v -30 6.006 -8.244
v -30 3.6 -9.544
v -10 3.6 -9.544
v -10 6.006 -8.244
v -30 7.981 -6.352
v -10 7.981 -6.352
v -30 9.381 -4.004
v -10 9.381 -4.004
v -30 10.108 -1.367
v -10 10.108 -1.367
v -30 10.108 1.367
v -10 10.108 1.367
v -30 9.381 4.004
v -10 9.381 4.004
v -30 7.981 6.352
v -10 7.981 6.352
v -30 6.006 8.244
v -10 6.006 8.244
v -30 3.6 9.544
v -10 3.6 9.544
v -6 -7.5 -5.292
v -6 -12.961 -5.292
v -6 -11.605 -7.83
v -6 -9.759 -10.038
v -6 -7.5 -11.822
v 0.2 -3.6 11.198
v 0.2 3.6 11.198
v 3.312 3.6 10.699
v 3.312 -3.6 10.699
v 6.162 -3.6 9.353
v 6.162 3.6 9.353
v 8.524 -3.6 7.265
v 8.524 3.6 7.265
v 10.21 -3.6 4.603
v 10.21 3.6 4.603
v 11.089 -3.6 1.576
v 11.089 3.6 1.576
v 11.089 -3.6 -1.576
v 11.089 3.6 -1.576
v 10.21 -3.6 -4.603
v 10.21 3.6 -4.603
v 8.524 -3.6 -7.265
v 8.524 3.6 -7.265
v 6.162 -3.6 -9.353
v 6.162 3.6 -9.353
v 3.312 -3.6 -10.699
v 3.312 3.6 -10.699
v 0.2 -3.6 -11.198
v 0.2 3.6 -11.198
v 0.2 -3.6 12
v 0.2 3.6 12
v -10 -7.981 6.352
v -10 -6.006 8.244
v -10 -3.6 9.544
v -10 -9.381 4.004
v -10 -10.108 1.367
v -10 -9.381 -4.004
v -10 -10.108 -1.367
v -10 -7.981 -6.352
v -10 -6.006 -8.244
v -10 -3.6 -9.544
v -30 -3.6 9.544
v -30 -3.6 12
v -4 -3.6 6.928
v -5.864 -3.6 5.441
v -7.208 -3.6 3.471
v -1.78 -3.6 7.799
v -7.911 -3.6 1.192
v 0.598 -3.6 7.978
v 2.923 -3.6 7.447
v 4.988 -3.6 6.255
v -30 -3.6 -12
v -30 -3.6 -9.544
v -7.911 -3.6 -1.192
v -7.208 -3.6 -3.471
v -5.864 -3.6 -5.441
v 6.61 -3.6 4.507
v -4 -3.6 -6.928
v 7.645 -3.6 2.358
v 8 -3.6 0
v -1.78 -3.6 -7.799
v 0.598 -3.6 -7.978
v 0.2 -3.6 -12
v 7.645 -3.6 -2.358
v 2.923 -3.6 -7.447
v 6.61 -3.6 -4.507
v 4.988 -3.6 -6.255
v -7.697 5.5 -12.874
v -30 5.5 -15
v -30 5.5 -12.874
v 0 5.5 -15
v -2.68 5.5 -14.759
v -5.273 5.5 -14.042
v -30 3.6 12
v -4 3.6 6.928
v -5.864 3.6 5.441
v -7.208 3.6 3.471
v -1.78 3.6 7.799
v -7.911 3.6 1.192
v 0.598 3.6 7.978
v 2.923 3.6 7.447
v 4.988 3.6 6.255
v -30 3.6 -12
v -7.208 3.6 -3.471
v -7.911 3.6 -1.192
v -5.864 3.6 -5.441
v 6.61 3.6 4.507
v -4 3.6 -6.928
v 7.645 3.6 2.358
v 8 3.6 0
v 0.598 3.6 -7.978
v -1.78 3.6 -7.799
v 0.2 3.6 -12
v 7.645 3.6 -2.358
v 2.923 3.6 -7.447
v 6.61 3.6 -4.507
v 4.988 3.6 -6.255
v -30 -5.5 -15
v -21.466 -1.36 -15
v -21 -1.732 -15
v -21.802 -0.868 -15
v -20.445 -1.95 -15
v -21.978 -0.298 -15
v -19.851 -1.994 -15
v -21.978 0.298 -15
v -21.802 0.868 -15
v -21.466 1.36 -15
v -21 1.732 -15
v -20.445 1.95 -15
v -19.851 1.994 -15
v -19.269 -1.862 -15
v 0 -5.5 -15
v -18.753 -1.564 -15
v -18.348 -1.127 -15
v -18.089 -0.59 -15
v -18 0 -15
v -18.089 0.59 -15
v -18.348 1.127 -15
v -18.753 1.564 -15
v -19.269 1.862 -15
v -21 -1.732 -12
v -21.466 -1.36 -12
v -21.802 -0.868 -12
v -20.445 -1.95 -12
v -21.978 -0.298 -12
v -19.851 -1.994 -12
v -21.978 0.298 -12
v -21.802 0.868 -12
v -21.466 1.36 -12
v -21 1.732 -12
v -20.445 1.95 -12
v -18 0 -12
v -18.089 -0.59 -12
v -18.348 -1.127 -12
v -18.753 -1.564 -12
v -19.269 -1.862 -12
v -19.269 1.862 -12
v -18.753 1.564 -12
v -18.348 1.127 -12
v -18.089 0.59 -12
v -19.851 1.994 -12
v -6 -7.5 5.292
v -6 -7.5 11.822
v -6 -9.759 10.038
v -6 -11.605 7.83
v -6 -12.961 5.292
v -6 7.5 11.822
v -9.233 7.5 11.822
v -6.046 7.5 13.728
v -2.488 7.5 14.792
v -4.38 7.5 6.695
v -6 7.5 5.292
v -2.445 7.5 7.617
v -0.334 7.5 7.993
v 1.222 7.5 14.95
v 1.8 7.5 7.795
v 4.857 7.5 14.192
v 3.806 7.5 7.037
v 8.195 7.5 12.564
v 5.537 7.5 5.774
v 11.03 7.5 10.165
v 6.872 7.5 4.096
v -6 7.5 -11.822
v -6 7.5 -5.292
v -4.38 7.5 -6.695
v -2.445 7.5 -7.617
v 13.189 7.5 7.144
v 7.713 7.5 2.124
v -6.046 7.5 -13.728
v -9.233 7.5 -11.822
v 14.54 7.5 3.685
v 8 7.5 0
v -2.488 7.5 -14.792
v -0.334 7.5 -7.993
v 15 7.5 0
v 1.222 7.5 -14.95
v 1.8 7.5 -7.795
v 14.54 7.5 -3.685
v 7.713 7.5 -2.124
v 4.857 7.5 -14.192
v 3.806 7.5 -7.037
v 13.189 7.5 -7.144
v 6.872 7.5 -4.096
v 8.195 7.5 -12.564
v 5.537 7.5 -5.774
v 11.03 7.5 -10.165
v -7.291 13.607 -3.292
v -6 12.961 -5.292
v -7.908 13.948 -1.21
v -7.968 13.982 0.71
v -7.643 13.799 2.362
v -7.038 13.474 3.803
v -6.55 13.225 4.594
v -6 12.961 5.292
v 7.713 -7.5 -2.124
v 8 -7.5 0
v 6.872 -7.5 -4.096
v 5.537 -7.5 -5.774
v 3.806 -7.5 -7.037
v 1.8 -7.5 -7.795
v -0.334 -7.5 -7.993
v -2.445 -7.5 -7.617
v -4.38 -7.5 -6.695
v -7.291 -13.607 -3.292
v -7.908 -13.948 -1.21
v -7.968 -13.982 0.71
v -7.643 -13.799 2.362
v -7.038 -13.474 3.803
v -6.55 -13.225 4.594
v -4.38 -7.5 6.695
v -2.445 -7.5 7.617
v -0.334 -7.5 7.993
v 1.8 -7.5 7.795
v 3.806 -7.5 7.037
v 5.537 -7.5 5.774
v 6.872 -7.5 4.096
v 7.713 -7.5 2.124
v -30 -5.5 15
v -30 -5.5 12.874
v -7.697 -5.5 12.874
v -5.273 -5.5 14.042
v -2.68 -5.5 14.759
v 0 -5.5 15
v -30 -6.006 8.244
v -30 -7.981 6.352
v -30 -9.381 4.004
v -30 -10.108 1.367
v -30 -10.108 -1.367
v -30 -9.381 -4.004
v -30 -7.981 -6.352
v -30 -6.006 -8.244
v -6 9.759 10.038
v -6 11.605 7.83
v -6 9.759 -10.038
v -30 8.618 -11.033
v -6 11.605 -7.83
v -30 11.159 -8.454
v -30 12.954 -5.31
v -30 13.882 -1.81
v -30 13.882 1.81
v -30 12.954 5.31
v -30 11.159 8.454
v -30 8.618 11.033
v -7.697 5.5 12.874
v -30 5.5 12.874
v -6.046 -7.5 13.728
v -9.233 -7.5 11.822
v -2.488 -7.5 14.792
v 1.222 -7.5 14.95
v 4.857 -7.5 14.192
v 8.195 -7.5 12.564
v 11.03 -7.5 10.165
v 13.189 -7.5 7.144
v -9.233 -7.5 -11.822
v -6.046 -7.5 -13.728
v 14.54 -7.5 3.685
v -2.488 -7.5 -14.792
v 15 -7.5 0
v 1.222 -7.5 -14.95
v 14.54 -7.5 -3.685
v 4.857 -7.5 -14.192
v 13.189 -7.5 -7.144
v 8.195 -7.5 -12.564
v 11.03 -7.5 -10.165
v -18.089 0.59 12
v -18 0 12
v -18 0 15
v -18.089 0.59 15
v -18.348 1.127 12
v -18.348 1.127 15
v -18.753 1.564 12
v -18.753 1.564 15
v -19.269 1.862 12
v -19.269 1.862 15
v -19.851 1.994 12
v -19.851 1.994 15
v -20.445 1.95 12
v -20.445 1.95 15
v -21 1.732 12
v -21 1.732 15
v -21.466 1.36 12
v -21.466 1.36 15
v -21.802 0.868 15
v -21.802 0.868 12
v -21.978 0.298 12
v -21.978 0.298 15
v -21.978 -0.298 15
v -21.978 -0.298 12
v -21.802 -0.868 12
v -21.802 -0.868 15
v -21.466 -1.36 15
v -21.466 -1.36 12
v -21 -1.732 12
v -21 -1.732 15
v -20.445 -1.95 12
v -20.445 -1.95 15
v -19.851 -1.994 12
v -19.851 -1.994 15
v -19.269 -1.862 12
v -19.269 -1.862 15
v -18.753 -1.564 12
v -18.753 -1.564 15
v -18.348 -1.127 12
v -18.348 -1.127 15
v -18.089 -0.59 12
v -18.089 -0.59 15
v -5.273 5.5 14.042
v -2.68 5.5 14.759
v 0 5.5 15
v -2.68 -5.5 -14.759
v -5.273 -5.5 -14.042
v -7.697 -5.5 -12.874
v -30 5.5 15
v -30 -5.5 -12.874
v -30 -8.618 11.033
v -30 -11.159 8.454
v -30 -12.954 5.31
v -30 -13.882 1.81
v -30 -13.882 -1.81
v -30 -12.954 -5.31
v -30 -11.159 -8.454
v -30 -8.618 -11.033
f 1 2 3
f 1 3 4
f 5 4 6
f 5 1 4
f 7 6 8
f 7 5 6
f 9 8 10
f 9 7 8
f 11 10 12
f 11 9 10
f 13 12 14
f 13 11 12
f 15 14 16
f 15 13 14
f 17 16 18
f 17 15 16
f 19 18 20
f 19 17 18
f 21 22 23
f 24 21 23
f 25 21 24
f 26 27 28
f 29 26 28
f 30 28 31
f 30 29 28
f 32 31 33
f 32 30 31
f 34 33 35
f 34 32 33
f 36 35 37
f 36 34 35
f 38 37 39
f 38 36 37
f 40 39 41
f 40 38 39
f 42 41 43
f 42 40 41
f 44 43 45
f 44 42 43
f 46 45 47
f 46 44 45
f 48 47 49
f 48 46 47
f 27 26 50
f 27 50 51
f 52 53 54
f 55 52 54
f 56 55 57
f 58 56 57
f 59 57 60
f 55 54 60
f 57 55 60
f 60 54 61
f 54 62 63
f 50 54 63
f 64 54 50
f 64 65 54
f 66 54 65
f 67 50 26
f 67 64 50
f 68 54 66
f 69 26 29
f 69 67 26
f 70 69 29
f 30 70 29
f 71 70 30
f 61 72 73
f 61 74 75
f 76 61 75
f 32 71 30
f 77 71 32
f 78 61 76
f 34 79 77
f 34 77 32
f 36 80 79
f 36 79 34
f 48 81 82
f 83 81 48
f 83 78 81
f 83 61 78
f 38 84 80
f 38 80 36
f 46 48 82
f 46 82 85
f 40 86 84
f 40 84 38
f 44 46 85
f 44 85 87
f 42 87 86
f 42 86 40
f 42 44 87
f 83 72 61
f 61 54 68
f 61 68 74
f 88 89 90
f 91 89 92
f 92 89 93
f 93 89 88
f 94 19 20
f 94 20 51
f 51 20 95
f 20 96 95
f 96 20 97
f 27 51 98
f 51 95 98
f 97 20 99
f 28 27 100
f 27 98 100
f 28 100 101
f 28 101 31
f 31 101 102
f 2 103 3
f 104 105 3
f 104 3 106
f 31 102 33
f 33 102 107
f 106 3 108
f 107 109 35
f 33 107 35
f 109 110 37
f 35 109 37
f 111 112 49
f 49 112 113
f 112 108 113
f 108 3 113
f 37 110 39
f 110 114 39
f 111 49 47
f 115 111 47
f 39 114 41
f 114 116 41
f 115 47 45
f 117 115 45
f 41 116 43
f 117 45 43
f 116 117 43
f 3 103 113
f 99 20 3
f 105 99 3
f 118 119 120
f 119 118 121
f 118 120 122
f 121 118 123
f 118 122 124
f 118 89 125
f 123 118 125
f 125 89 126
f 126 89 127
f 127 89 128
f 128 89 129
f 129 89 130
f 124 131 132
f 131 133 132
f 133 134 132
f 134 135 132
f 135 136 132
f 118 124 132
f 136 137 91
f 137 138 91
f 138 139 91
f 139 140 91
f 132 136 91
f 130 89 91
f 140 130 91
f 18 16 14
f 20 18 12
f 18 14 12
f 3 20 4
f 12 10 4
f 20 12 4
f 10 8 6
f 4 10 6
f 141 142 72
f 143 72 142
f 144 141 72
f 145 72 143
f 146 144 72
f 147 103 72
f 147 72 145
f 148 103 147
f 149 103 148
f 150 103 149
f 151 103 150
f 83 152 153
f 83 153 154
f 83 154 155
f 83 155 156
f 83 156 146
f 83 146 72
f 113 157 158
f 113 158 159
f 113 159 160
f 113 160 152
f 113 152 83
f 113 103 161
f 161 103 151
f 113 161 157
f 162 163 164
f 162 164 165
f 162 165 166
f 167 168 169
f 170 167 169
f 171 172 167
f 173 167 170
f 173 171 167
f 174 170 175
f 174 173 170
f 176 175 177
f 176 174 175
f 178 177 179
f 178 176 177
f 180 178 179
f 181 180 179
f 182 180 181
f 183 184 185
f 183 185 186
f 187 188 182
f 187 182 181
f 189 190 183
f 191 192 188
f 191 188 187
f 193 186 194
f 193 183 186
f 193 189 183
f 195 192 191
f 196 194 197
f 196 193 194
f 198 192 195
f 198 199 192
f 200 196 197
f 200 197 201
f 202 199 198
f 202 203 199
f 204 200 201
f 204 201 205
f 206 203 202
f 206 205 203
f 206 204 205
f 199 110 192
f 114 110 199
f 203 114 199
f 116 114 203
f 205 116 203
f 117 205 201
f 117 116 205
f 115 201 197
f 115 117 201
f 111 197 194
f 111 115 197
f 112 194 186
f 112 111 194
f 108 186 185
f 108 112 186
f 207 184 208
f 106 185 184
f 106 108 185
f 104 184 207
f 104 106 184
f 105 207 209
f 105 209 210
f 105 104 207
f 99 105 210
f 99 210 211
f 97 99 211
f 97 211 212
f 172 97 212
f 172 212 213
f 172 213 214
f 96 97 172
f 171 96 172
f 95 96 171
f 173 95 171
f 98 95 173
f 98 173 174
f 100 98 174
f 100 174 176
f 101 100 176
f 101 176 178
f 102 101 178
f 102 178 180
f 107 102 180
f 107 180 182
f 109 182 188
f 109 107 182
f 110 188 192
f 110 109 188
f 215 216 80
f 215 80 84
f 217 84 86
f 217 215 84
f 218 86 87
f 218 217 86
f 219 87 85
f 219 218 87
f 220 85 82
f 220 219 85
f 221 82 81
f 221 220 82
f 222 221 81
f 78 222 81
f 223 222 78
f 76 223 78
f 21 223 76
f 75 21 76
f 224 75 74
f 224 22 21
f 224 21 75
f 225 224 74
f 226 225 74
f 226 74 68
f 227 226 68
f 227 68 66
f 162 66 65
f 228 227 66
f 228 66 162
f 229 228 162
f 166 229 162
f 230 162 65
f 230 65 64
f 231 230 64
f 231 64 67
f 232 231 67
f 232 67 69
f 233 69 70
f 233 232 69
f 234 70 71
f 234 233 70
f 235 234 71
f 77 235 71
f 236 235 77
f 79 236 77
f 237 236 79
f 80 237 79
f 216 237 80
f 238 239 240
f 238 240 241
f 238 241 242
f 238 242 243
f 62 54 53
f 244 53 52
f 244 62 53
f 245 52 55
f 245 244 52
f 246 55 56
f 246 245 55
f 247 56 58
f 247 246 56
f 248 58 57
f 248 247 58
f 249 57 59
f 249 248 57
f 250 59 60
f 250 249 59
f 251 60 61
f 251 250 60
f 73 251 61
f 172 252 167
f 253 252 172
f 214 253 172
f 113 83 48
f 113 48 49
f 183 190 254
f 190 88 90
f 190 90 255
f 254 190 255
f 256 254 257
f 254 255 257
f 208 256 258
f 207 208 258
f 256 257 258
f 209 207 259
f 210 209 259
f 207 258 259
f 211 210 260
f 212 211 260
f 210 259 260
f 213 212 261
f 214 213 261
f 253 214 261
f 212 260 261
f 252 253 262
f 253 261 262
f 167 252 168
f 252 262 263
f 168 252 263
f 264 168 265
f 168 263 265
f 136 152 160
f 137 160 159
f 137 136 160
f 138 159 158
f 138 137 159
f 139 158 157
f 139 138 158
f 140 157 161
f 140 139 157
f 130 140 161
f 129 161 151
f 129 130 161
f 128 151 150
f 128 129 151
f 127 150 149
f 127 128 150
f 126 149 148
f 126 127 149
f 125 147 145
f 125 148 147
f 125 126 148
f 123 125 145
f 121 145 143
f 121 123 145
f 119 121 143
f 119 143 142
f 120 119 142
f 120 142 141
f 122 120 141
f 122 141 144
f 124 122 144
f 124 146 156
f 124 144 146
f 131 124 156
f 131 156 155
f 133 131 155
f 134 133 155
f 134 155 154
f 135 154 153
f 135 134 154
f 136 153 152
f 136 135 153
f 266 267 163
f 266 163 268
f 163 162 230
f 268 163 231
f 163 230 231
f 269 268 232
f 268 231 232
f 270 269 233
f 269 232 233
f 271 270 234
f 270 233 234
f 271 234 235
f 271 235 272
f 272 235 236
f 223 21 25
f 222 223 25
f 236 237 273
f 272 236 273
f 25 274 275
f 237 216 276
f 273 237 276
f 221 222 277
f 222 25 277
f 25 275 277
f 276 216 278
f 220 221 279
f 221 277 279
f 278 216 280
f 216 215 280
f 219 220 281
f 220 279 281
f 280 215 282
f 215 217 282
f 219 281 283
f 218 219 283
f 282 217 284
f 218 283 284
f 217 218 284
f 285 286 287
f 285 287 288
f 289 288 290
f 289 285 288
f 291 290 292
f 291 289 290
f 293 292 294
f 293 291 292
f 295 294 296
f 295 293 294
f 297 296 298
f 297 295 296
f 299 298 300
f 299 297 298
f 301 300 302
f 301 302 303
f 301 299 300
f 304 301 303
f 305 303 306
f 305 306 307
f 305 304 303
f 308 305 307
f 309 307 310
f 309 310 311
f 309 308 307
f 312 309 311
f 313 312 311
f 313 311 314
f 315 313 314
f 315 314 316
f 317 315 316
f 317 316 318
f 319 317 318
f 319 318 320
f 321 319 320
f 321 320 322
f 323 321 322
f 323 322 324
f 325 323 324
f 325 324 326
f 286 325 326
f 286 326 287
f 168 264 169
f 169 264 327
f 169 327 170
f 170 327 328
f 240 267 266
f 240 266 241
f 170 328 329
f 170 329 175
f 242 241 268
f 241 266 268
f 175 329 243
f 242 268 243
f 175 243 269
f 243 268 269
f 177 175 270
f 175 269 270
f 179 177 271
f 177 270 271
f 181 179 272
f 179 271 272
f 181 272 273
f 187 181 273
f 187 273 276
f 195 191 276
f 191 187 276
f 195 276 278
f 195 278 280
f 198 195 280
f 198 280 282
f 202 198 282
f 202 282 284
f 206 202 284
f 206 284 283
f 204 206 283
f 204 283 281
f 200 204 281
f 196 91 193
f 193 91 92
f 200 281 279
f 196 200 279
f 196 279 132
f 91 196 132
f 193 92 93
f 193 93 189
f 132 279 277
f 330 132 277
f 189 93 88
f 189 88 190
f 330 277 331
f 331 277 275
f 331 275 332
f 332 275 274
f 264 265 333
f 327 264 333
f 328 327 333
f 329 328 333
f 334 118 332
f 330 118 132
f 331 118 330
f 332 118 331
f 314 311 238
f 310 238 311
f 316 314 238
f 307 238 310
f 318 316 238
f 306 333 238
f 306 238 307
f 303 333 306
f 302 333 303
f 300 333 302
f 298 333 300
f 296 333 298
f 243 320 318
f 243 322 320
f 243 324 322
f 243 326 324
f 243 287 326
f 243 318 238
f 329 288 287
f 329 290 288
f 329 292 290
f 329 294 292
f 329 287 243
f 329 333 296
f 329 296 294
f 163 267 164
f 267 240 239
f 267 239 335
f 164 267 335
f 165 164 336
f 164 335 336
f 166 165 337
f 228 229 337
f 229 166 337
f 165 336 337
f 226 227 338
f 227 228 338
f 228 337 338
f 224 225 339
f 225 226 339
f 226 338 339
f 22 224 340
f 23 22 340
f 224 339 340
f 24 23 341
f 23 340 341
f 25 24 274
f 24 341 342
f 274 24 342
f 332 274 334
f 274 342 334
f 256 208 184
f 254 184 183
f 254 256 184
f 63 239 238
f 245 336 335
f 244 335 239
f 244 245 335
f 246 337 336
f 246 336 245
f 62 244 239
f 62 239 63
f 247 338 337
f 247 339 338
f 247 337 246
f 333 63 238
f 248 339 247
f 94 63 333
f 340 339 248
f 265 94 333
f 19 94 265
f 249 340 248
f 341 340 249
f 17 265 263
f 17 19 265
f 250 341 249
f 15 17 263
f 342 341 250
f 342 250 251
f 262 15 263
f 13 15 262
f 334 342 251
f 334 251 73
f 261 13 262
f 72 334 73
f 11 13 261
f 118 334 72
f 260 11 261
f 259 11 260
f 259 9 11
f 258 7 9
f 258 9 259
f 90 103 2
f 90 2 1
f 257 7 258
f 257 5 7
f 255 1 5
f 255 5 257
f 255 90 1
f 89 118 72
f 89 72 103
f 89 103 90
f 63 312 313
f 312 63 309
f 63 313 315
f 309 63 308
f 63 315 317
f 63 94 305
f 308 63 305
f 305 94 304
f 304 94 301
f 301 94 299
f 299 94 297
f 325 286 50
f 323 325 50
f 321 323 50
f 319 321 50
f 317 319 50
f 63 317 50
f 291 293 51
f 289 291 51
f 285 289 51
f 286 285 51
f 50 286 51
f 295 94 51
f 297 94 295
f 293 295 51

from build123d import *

# Parameters (mm, degrees)
CYLINDER003_R           = 10.2
CYLINDER003_DEPTH       = 20
CYLINDER003_PITCH_ANGLE = 90
CYLINDER_R              = 11.2
CYLINDER_DEPTH          = 7.2
CYLINDER_ROLL_ANGLE     = -90
CYLINDER005_R           = 2
CYLINDER005_DEPTH       = 30
BOX_W                   = 30.2
BOX_H                   = 7.2
BOX_DEPTH               = 24
CYLINDER004_R           = 8
CYLINDER004_DEPTH       = 30
CYLINDER004_ROLL_ANGLE  = -90
CYLINDER002_R           = 14
CYLINDER002_DEPTH       = 24
CYLINDER002_PITCH_ANGLE = 90
BOX001_W                = 30
BOX001_H                = 11
BOX001_DEPTH            = 30
CYLINDER001_R           = 15
CYLINDER001_DEPTH       = 15
CYLINDER001_ROLL_ANGLE  = -90


with BuildPart() as pipe:
    # Cylinder003 → Cylinder003 (new body)
    with BuildSketch(Plane.XY):
        Circle(CYLINDER003_R)
    extrude(amount=CYLINDER003_DEPTH)


with BuildPart() as pipe_1:
    # Cylinder003 pitch: moved
    add(pipe.part.rotate(Axis((0, 0, 0), (0, 1, 0)), CYLINDER003_PITCH_ANGLE))


with BuildPart() as pipe_2:
    # Cylinder003 placement: moved
    add(pipe_1.part.moved(Location((-30, 0, 0))))


with BuildPart() as bearing:
    # Cylinder → Cylinder (new body)
    with BuildSketch(Plane.XY):
        Circle(CYLINDER_R)
    extrude(amount=CYLINDER_DEPTH)


with BuildPart() as bearing_1:
    # Cylinder roll: moved
    add(bearing.part.rotate(Axis((0, 0, 0), (1, 0, 0)), CYLINDER_ROLL_ANGLE))


with BuildPart() as bearing_2:
    # Cylinder placement: moved
    add(bearing_1.part.moved(Location((0, -3.6, 0))))


with BuildPart() as cylinder003:
    # Cylinder005 → Cylinder005 (new body)
    with BuildSketch(Plane(origin=(-20, 0, -15), x_dir=(1, 0, 0), z_dir=(0, 0, 1))):
        Circle(CYLINDER005_R)
    extrude(amount=CYLINDER005_DEPTH)


with BuildPart() as cube:
    # Box → Box (new body)
    with BuildSketch(Plane(origin=(-30, -3.6, -12), x_dir=(1, 0, 0), z_dir=(0, 0, 1))):
        with Locations((15.1, 3.6)):
            Rectangle(BOX_W, BOX_H)
    extrude(amount=BOX_DEPTH)


with BuildPart() as negative_fusion:
    # Cylinder004 → Cylinder004 (new body)
    with BuildSketch(Plane.XY):
        Circle(CYLINDER004_R)
    extrude(amount=CYLINDER004_DEPTH)


with BuildPart() as negative_fusion_1:
    # Cylinder004 roll: moved
    add(negative_fusion.part.rotate(Axis((0, 0, 0), (1, 0, 0)), CYLINDER004_ROLL_ANGLE))


with BuildPart() as negative_fusion_2:
    # Cylinder004 placement: moved
    add(negative_fusion_1.part.moved(Location((0, -15, 0))))

    # Fusion001: union Pipe, Bearing, Cylinder003, Cube
    add(pipe_2.part)
    add(bearing_2.part)
    add(cylinder003.part)
    add(cube.part)


with BuildPart() as cylinder002:
    # Cylinder002 → Cylinder002 (new body)
    with BuildSketch(Plane.XY):
        Circle(CYLINDER002_R)
    extrude(amount=CYLINDER002_DEPTH)


with BuildPart() as cylinder002_1:
    # Cylinder002 pitch: moved
    add(cylinder002.part.rotate(Axis((0, 0, 0), (0, 1, 0)), CYLINDER002_PITCH_ANGLE))


with BuildPart() as cylinder002_2:
    # Cylinder002 placement: moved
    add(cylinder002_1.part.moved(Location((-30, 0, 0))))


with BuildPart() as cube001:
    # Box001 → Box001 (new body)
    with BuildSketch(Plane(origin=(-30, -5.5, -15), x_dir=(1, 0, 0), z_dir=(0, 0, 1))):
        with Locations((15, 5.5)):
            Rectangle(BOX001_W, BOX001_H)
    extrude(amount=BOX001_DEPTH)


with BuildPart() as cut:
    # Cylinder001 → Cylinder001 (new body)
    with BuildSketch(Plane.XY):
        Circle(CYLINDER001_R)
    extrude(amount=CYLINDER001_DEPTH)


with BuildPart() as cut_1:
    # Cylinder001 roll: moved
    add(cut.part.rotate(Axis((0, 0, 0), (1, 0, 0)), CYLINDER001_ROLL_ANGLE))


with BuildPart() as cut_2:
    # Cylinder001 placement: moved
    add(cut_1.part.moved(Location((0, -7.5, 0))))

    # Fusion: union Cylinder002, Cube001
    add(cylinder002_2.part)
    add(cube001.part)

    # Cut: cut Negative Fusion
    add(negative_fusion_2.part, mode=Mode.SUBTRACT)


solid = cut_2.part
